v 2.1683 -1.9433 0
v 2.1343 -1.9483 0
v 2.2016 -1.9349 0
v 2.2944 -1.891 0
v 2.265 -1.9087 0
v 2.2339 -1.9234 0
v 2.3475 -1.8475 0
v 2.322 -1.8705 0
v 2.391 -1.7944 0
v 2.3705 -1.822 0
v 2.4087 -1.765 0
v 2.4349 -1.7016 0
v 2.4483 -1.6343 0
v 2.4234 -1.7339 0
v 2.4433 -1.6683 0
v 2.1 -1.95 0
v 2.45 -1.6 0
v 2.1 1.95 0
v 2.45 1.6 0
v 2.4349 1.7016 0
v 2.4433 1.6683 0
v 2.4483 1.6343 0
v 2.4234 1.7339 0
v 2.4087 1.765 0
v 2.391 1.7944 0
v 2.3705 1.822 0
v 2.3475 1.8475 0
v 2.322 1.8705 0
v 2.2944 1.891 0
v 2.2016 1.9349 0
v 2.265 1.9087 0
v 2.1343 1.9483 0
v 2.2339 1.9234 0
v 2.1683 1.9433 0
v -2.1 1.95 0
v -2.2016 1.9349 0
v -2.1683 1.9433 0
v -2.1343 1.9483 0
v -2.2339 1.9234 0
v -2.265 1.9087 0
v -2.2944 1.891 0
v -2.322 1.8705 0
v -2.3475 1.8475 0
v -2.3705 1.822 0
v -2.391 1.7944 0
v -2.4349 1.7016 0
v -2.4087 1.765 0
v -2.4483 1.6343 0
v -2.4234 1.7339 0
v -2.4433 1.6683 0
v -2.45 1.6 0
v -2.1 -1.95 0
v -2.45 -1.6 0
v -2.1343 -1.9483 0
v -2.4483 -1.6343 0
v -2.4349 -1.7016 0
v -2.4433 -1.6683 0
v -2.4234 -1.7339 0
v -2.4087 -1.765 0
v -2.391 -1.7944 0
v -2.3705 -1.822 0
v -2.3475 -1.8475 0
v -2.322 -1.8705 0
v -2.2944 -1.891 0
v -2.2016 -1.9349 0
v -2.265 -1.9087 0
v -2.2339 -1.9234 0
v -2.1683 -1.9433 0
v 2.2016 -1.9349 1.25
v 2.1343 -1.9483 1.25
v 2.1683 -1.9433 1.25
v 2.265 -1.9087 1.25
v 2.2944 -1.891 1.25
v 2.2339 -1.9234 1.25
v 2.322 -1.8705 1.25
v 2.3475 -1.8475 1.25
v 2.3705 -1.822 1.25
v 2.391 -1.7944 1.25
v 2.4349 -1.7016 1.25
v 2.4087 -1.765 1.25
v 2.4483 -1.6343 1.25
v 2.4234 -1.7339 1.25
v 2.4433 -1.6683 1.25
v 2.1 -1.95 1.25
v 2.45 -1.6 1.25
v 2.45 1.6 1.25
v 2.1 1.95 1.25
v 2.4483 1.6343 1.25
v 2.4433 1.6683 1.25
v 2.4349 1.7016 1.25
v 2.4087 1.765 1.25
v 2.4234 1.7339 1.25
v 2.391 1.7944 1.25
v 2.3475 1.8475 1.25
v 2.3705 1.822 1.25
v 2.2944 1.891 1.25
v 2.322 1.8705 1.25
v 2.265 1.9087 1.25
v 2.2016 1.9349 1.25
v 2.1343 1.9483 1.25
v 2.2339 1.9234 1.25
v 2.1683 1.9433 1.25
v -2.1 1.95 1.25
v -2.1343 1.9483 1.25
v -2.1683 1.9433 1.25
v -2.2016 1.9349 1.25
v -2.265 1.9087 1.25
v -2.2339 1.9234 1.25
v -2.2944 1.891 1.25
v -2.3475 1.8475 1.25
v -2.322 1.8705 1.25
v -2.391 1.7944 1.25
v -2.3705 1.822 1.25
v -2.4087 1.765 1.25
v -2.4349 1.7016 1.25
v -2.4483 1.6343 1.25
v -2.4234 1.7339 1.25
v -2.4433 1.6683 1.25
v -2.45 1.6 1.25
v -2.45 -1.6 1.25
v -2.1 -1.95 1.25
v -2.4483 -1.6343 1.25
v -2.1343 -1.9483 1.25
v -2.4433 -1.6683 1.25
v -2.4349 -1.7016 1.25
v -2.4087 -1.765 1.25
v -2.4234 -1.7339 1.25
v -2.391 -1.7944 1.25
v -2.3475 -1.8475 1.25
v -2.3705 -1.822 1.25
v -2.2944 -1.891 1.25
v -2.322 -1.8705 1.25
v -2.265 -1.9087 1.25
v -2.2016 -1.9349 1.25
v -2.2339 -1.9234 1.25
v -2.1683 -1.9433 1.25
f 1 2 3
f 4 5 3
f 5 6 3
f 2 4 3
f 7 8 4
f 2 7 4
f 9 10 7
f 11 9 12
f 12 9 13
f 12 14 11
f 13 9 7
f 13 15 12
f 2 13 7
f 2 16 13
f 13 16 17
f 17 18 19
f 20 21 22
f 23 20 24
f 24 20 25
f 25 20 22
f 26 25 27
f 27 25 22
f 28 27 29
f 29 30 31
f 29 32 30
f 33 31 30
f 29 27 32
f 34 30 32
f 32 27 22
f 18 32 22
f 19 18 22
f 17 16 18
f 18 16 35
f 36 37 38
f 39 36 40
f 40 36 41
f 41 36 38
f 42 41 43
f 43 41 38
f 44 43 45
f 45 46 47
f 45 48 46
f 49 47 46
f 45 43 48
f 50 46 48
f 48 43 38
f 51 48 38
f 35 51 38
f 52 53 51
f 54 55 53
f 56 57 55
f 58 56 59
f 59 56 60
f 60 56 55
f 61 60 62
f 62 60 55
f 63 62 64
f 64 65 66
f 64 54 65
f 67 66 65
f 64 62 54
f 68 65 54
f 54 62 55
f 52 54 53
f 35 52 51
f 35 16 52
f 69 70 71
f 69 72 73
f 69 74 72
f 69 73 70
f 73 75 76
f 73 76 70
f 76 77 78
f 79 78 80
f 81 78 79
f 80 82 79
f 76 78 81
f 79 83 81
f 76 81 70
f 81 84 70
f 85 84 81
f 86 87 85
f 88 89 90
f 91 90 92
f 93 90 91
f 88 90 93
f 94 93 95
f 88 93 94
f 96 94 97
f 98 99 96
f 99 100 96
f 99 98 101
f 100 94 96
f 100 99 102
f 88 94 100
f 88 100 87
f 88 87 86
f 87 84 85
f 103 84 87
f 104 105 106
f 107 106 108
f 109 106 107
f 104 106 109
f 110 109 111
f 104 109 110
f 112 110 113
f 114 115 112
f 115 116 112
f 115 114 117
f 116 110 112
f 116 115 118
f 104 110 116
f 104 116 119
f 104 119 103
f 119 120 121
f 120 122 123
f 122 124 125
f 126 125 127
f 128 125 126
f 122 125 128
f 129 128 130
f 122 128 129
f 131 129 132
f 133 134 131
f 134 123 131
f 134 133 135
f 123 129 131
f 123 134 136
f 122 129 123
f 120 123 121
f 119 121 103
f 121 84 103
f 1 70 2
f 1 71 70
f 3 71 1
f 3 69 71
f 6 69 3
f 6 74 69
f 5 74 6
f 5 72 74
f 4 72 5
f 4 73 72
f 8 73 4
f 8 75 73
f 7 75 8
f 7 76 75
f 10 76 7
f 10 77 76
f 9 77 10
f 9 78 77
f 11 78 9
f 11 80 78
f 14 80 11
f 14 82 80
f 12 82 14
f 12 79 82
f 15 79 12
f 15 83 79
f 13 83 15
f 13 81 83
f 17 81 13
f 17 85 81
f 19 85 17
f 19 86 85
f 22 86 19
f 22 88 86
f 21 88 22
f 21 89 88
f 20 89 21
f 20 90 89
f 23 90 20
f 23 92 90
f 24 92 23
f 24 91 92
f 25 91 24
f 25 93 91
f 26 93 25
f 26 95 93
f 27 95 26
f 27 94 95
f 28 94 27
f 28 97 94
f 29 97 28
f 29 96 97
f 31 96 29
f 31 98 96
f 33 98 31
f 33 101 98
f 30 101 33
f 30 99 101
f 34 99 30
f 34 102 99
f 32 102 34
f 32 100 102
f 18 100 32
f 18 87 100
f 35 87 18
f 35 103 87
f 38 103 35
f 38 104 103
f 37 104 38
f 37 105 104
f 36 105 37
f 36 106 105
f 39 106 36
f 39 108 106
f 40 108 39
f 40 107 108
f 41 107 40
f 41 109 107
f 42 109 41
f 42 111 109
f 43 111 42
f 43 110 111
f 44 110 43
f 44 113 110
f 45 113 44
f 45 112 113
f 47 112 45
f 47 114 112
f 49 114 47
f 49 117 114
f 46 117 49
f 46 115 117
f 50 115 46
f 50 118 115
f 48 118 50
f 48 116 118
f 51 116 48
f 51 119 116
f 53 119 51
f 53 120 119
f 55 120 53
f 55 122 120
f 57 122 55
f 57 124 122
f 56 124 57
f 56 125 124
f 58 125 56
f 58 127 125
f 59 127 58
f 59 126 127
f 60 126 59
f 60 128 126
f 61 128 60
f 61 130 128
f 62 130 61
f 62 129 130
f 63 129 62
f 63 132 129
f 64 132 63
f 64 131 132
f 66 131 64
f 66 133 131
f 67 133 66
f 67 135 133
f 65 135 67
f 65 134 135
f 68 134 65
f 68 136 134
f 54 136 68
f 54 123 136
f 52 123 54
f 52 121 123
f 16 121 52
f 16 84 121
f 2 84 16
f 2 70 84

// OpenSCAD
$fn = 64;

module smd(size=[4.90, 3.90, 1.25], corner_r=0.35) {
    sx = size[0];
    sy = size[1];
    sz = size[2];
    r = min(corner_r, sx/2, sy/2);

    color([0.15, 0.15, 0.15])
    linear_extrude(height=sz)
        offset(r=r)
            square([sx-2*r, sy-2*r], center=true);
}

smd([4.90, 3.90, 1.25]);
